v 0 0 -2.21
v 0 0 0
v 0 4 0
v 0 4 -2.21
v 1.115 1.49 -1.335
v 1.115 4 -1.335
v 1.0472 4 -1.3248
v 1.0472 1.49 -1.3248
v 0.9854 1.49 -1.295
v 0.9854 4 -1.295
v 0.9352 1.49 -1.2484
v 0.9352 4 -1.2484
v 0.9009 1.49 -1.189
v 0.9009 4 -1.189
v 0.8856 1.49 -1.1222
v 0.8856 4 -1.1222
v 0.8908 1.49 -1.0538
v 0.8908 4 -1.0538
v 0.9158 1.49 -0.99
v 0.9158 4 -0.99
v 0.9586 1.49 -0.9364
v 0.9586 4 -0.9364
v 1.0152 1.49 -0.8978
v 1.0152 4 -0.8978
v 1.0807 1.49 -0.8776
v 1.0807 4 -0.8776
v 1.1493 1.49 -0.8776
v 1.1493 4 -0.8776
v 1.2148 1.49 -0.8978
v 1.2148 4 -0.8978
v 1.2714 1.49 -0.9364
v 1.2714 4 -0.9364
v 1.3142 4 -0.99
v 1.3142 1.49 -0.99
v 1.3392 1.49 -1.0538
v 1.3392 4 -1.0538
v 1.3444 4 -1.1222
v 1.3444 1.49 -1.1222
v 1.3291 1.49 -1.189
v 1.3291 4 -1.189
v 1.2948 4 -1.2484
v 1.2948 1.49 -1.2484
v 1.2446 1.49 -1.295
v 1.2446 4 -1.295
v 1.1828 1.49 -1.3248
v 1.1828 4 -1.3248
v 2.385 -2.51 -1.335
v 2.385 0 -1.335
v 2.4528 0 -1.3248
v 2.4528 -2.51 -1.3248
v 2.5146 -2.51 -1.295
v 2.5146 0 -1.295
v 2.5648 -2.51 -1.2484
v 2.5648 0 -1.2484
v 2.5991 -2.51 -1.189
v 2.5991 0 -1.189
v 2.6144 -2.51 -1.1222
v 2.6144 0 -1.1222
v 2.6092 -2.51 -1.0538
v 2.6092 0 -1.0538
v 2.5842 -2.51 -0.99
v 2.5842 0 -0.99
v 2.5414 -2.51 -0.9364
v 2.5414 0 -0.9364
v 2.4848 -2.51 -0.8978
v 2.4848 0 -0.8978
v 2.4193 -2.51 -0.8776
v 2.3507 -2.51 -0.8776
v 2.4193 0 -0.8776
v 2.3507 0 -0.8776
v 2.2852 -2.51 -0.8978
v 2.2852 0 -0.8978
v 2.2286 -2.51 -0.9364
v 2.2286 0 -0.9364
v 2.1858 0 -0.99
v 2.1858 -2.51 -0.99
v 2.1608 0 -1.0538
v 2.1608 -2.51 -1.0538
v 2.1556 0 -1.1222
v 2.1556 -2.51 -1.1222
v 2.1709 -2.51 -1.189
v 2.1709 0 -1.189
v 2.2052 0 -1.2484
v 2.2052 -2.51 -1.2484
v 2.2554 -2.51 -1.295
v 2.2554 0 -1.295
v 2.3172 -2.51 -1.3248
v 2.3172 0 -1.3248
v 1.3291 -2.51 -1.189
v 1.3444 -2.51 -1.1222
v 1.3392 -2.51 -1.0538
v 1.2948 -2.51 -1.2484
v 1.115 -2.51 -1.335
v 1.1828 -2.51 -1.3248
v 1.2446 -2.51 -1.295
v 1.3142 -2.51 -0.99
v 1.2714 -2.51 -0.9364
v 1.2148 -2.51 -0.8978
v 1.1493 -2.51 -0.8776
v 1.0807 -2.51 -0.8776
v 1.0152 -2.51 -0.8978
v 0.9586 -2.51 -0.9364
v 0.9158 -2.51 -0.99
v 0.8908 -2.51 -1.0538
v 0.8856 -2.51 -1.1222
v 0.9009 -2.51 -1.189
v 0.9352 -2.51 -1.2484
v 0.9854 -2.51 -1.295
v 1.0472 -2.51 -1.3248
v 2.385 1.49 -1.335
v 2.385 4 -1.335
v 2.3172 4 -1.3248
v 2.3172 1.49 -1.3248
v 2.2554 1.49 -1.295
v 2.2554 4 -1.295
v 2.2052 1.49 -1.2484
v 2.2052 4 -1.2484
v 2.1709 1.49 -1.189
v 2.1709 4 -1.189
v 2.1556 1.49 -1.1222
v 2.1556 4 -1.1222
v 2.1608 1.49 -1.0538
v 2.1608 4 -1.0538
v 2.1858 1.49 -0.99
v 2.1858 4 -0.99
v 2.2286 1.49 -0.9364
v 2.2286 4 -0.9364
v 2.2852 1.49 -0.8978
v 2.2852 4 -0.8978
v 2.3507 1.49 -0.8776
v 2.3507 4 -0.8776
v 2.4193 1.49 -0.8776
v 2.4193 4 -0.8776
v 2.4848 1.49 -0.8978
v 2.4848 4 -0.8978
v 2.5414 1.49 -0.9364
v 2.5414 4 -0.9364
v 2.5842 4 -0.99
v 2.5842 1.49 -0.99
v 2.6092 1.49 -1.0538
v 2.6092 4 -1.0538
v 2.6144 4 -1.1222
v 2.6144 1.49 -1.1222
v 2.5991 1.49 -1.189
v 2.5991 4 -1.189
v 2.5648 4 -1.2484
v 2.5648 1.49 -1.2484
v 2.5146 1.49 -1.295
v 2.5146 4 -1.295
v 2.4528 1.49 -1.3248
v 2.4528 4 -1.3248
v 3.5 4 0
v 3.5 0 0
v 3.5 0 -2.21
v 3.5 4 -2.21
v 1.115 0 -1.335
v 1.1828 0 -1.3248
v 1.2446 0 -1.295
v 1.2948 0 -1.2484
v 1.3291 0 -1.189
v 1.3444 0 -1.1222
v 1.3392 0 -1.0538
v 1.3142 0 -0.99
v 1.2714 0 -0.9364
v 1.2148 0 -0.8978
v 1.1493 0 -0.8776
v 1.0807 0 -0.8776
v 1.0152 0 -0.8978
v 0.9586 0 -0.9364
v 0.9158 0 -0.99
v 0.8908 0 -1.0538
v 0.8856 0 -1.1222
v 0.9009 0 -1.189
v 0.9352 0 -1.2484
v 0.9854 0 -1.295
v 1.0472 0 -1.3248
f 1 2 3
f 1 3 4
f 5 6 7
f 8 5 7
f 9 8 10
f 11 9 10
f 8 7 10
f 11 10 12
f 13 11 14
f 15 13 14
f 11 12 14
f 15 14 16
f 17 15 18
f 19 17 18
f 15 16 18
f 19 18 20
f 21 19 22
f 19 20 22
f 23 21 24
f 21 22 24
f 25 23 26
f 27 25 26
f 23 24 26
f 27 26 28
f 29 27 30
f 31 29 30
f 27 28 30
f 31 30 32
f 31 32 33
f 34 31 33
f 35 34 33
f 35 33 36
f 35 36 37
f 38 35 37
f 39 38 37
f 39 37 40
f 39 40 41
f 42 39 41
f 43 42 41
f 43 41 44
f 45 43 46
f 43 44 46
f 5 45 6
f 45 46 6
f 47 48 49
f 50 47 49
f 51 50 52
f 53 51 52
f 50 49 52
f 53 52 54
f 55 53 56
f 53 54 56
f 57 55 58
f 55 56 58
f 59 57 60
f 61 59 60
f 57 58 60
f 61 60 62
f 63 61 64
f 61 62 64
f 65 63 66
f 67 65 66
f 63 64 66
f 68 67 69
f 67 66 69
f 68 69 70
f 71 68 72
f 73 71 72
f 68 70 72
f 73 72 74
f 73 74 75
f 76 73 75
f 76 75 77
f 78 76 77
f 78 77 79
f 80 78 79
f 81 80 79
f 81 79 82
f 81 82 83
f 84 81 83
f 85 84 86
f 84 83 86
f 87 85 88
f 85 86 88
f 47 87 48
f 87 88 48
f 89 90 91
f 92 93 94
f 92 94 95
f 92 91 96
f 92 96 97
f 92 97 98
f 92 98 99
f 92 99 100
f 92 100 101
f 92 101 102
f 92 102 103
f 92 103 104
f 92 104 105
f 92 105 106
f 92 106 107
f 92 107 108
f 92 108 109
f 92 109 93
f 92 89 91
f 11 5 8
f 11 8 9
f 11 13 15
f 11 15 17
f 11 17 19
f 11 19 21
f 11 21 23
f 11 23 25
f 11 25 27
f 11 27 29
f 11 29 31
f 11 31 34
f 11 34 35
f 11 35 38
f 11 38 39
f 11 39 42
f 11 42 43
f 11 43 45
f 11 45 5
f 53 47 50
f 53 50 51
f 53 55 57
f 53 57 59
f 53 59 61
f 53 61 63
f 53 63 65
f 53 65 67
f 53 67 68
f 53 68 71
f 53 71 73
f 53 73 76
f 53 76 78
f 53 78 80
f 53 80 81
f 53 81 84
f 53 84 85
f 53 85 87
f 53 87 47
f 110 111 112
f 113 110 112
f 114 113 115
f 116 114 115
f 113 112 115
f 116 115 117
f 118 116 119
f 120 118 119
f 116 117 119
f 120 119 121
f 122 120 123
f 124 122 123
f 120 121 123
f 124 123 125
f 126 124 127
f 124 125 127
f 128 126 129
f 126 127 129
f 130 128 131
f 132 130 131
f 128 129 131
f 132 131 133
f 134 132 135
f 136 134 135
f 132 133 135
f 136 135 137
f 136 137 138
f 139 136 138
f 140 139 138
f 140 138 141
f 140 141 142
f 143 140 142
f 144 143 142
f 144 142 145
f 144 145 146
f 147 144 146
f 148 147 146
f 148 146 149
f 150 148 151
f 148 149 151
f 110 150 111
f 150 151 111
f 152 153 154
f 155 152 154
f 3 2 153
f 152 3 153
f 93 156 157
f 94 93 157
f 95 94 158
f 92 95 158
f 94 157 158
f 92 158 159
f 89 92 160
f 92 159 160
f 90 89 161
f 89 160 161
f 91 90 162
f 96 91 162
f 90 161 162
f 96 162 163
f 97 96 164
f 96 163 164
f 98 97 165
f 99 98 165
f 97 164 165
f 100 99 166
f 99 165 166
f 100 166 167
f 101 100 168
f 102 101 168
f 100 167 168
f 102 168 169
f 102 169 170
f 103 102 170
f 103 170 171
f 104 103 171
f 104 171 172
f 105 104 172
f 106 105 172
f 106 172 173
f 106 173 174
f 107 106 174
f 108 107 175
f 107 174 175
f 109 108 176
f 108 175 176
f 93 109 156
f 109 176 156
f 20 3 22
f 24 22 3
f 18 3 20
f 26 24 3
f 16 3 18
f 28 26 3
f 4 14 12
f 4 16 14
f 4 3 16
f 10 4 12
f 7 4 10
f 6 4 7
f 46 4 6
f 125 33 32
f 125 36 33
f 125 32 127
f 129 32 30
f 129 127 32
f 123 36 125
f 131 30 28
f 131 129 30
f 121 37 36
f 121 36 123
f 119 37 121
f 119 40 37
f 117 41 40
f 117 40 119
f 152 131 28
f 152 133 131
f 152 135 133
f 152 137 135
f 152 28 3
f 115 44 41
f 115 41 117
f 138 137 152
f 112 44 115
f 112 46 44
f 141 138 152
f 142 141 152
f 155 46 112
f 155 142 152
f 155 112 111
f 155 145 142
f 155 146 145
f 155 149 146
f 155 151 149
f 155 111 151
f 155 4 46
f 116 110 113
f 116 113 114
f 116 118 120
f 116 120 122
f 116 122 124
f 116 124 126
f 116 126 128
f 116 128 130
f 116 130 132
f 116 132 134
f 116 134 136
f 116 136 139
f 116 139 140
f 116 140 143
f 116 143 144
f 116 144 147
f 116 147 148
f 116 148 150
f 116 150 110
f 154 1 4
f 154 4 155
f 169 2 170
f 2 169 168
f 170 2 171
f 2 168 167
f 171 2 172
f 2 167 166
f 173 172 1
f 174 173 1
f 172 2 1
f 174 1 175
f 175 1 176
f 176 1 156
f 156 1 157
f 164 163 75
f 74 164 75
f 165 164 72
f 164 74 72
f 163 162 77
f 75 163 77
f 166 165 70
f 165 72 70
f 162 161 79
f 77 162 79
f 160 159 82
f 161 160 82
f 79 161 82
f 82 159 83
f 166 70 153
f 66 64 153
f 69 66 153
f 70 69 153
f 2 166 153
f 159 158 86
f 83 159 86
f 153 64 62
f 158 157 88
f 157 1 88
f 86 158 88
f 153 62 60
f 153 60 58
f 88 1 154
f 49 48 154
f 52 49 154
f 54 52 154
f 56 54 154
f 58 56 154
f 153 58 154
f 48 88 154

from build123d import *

# Parameters (mm, degrees)
SKETCH1_W           = 3.5
SKETCH1_H           = 2.21
BOSS_EXTRUDE1_DEPTH = 4
SKETCH2_R           = 0.23
BOSS_EXTRUDE2_DEPTH = 2.51
SKETCH3_R           = 0.23
CUT_EXTRUDE1_DEPTH  = 2.51


with BuildPart() as part:
    # Sketch1 → Boss-Extrude1 (new body)
    with BuildSketch(Plane(origin=(0, 0, 0), x_dir=(1, 0, 0), z_dir=(0, 1, 0))):
        with Locations((1.75, 1.105)):
            Rectangle(SKETCH1_W, SKETCH1_H)
    extrude(amount=BOSS_EXTRUDE1_DEPTH)

    # Sketch2 → Boss-Extrude2 (add)
    with BuildSketch(Plane.XZ):
        with Locations(Location((1.115, -1.105, 0), (0, 0, 270))):
            Circle(SKETCH2_R)
        with Locations(Location((2.385, -1.105, 0), (0, 0, 270))):
            Circle(SKETCH2_R)
    extrude(amount=BOSS_EXTRUDE2_DEPTH)

    # Sketch3 → Cut-Extrude1 (cut)
    with BuildSketch(Plane(origin=(0, 4, 0), x_dir=(1, 0, 0), z_dir=(0, 1, 0))):
        with Locations(Location((2.385, 1.105, 0), (0, 0, 90))):
            Circle(SKETCH3_R)
        with Locations(Location((1.115, 1.105, 0), (0, 0, 90))):
            Circle(SKETCH3_R)
    extrude(amount=-CUT_EXTRUDE1_DEPTH, mode=Mode.SUBTRACT)


solid = part.part
